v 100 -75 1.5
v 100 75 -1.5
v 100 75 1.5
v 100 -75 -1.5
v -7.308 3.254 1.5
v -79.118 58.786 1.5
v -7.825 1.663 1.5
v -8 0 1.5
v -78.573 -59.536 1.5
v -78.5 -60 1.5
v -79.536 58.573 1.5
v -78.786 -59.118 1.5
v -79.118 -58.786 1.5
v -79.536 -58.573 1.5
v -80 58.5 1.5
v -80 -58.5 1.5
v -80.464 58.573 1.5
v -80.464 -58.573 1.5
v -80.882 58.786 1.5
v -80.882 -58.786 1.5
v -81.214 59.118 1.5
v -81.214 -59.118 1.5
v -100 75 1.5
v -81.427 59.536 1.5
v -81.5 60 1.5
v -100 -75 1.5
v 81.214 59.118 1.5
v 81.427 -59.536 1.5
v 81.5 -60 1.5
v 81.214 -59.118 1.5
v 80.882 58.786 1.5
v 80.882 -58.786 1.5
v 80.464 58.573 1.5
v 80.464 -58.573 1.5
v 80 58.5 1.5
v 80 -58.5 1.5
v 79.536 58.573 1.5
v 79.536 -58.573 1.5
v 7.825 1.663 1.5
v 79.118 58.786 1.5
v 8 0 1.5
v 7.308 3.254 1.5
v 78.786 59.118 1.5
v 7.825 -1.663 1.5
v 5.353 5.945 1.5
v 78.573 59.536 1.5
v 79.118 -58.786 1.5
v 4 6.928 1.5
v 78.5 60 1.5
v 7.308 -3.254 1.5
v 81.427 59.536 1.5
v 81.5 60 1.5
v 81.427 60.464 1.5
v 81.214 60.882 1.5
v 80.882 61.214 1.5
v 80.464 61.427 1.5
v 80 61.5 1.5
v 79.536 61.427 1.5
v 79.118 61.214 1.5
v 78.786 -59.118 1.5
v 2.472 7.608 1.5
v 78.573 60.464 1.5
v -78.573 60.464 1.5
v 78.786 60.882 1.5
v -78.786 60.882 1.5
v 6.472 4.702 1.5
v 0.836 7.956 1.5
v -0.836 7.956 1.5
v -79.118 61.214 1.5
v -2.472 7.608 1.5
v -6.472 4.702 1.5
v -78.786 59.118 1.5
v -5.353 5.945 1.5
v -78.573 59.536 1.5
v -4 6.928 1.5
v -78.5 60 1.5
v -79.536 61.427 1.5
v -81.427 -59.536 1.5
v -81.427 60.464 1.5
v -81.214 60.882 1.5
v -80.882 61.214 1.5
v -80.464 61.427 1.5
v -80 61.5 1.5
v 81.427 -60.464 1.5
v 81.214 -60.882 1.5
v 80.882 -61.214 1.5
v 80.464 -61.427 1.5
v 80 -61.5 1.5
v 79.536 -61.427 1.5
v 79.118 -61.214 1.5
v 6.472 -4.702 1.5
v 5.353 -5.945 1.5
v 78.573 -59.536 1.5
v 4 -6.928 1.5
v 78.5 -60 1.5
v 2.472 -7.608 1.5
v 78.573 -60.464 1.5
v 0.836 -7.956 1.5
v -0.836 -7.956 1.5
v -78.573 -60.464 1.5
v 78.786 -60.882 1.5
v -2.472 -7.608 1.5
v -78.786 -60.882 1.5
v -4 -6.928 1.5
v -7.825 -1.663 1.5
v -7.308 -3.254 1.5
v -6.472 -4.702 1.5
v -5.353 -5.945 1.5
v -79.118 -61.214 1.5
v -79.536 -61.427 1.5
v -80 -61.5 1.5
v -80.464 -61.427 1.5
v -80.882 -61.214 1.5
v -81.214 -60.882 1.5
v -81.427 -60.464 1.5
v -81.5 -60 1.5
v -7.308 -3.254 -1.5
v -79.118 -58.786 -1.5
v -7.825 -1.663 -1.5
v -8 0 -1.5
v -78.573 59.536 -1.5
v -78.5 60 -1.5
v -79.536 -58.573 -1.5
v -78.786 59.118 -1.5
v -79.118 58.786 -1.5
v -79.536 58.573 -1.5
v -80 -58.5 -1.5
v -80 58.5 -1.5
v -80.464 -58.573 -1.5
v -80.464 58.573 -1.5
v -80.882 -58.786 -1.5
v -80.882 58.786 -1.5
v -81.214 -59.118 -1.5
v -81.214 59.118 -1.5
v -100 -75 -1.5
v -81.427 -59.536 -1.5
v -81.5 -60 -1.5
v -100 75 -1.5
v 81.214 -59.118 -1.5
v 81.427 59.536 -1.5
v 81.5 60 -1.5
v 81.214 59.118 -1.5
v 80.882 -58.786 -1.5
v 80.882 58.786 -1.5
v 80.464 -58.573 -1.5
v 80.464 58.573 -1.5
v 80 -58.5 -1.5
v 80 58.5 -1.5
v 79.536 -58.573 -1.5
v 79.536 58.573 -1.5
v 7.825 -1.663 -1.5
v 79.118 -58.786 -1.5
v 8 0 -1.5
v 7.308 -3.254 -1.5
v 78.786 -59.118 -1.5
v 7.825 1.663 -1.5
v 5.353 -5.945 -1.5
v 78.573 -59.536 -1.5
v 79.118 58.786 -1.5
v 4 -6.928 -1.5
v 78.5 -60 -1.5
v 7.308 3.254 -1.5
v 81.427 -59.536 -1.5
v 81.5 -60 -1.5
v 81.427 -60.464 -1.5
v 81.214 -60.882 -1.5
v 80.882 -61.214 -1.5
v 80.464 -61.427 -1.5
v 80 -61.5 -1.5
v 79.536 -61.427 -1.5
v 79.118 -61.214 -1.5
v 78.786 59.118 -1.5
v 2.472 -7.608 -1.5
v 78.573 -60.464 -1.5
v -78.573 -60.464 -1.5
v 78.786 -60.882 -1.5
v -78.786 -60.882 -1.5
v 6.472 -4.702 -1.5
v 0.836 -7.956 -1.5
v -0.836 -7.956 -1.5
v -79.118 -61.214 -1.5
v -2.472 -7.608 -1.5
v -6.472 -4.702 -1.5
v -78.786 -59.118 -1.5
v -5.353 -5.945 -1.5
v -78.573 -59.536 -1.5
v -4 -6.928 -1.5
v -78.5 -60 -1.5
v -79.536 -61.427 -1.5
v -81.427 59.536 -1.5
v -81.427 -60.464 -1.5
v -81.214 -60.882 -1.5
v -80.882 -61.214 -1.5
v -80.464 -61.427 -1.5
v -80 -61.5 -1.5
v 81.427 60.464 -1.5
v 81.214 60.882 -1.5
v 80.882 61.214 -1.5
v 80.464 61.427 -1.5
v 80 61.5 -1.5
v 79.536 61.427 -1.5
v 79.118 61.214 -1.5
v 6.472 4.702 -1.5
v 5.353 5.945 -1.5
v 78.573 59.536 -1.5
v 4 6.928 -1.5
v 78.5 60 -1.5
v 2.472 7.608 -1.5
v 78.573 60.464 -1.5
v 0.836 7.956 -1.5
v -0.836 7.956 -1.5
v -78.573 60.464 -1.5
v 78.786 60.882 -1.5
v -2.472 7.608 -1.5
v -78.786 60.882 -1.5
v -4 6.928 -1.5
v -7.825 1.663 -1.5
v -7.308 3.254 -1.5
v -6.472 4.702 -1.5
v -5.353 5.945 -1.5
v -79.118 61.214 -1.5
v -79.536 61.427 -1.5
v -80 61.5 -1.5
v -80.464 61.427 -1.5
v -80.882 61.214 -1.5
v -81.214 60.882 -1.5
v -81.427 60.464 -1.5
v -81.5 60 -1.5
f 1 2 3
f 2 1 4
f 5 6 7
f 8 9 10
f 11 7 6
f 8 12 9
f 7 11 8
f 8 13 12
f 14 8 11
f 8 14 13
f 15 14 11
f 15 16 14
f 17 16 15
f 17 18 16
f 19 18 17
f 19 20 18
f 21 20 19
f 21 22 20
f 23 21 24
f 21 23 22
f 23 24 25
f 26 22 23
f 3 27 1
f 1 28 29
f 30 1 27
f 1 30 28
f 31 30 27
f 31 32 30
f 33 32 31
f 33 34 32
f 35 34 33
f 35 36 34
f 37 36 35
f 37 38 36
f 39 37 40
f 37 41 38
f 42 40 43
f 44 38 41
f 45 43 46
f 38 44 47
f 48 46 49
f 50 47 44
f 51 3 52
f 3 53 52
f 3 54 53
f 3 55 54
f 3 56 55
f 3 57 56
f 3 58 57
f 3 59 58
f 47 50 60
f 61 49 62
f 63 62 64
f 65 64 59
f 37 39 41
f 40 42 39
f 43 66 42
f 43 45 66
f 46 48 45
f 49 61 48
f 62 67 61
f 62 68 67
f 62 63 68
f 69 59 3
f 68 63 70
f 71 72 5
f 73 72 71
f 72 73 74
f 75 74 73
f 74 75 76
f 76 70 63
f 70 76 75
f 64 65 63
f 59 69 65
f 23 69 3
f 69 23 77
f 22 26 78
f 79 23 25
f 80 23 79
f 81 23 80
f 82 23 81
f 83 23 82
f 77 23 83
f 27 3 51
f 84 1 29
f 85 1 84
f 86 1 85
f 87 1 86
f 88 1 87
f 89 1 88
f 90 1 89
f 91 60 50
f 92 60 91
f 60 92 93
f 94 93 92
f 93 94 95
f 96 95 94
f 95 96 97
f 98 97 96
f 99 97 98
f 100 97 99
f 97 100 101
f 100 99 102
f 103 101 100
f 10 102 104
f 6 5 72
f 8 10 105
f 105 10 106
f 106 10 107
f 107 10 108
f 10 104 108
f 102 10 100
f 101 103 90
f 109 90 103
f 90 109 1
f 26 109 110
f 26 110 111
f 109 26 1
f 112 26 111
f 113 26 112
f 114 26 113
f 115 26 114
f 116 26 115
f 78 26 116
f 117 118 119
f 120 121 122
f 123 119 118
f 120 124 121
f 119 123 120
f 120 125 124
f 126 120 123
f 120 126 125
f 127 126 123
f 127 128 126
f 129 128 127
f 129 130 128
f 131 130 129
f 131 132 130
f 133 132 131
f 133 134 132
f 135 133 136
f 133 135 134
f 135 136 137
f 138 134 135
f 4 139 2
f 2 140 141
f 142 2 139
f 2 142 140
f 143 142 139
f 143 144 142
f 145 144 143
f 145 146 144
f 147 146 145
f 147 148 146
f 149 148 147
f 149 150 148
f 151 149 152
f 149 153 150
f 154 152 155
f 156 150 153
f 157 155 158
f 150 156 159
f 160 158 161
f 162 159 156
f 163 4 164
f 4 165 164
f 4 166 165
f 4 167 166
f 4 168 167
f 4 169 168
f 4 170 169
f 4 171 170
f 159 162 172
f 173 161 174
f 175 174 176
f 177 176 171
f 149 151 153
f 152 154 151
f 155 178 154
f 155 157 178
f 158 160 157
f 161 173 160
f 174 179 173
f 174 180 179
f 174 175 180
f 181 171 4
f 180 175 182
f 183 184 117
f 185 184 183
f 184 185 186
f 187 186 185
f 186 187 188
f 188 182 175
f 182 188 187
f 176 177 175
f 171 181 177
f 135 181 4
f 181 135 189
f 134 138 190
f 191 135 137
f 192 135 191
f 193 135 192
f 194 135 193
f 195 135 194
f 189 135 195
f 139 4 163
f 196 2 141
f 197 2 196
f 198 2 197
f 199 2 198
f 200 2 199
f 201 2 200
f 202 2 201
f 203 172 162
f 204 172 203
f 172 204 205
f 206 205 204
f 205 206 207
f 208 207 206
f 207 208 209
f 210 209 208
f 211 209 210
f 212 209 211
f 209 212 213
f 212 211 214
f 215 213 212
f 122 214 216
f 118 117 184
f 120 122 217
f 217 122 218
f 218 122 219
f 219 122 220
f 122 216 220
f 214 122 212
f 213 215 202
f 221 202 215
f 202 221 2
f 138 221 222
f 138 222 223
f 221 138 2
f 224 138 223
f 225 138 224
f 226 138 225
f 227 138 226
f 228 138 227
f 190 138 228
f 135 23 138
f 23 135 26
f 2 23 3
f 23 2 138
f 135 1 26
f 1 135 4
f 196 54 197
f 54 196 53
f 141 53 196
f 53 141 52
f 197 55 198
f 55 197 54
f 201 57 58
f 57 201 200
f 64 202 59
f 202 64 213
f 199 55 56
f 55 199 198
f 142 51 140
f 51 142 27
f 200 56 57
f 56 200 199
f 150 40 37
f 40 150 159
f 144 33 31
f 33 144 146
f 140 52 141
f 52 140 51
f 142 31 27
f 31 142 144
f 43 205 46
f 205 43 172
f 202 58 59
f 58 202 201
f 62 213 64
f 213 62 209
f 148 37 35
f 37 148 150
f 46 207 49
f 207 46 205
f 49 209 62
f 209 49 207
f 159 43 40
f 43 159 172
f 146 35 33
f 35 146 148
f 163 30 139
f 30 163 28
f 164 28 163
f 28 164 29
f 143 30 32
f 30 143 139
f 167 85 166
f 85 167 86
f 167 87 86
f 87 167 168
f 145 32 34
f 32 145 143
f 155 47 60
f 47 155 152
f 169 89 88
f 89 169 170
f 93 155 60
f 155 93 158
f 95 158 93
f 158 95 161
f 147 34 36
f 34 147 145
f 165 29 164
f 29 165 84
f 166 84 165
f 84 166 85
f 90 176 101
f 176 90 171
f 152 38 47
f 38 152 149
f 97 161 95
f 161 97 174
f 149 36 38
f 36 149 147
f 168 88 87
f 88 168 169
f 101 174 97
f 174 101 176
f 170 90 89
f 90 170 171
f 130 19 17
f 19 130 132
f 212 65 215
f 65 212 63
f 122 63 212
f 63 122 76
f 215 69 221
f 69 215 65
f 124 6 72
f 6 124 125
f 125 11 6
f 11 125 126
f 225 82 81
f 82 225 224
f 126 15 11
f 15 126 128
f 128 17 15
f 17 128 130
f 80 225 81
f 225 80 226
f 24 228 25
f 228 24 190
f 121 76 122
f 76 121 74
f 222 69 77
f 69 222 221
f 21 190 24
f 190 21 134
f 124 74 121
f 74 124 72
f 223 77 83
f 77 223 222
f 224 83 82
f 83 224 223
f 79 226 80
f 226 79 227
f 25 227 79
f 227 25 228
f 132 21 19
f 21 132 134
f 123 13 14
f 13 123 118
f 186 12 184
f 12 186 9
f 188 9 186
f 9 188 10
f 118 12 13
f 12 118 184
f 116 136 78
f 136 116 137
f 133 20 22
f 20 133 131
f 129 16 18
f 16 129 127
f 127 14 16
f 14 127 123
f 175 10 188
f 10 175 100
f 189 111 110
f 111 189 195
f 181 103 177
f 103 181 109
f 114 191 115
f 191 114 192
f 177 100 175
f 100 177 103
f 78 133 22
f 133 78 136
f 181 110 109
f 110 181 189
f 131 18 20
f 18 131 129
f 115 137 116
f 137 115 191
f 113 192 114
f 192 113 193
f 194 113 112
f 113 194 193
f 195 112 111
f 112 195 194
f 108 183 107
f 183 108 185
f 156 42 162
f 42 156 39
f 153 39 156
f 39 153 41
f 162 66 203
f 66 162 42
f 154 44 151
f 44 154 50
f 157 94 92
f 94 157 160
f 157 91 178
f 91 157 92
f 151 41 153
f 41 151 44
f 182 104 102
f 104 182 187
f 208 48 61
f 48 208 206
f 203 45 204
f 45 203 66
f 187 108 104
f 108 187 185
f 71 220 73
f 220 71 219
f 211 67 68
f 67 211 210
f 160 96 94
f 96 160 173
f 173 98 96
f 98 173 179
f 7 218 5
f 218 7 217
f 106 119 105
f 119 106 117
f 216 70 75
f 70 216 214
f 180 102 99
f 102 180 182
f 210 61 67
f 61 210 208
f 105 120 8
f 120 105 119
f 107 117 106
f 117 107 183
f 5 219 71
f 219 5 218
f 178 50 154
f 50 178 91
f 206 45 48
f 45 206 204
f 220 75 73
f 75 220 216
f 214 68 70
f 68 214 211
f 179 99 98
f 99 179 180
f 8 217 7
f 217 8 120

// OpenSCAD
// 4WD Differential RC Car Chassis
// Editable OpenSCAD Source Design

chassis_length = 200; // mm
chassis_width  = 150; // mm
chassis_thick  = 3;   // mm (3mm plywood sheet)
hole_radius    = 1.5; // 3mm screw clearance

difference() {
    // Base plate outline
    cube([chassis_length, chassis_width, chassis_thick], center = true);

    // Front and rear motor bracket mounting holes
    translate([ 80,  60, 0]) cylinder(h = chassis_thick + 2, r = hole_radius, center = true, $fn = 20);
    translate([ 80, -60, 0]) cylinder(h = chassis_thick + 2, r = hole_radius, center = true, $fn = 20);
    translate([-80,  60, 0]) cylinder(h = chassis_thick + 2, r = hole_radius, center = true, $fn = 20);
    translate([-80, -60, 0]) cylinder(h = chassis_thick + 2, r = hole_radius, center = true, $fn = 20);

    // Center wiring pass-through slot
    translate([0, 0, 0]) cylinder(h = chassis_thick + 2, r = 8, center = true, $fn = 30);
}
